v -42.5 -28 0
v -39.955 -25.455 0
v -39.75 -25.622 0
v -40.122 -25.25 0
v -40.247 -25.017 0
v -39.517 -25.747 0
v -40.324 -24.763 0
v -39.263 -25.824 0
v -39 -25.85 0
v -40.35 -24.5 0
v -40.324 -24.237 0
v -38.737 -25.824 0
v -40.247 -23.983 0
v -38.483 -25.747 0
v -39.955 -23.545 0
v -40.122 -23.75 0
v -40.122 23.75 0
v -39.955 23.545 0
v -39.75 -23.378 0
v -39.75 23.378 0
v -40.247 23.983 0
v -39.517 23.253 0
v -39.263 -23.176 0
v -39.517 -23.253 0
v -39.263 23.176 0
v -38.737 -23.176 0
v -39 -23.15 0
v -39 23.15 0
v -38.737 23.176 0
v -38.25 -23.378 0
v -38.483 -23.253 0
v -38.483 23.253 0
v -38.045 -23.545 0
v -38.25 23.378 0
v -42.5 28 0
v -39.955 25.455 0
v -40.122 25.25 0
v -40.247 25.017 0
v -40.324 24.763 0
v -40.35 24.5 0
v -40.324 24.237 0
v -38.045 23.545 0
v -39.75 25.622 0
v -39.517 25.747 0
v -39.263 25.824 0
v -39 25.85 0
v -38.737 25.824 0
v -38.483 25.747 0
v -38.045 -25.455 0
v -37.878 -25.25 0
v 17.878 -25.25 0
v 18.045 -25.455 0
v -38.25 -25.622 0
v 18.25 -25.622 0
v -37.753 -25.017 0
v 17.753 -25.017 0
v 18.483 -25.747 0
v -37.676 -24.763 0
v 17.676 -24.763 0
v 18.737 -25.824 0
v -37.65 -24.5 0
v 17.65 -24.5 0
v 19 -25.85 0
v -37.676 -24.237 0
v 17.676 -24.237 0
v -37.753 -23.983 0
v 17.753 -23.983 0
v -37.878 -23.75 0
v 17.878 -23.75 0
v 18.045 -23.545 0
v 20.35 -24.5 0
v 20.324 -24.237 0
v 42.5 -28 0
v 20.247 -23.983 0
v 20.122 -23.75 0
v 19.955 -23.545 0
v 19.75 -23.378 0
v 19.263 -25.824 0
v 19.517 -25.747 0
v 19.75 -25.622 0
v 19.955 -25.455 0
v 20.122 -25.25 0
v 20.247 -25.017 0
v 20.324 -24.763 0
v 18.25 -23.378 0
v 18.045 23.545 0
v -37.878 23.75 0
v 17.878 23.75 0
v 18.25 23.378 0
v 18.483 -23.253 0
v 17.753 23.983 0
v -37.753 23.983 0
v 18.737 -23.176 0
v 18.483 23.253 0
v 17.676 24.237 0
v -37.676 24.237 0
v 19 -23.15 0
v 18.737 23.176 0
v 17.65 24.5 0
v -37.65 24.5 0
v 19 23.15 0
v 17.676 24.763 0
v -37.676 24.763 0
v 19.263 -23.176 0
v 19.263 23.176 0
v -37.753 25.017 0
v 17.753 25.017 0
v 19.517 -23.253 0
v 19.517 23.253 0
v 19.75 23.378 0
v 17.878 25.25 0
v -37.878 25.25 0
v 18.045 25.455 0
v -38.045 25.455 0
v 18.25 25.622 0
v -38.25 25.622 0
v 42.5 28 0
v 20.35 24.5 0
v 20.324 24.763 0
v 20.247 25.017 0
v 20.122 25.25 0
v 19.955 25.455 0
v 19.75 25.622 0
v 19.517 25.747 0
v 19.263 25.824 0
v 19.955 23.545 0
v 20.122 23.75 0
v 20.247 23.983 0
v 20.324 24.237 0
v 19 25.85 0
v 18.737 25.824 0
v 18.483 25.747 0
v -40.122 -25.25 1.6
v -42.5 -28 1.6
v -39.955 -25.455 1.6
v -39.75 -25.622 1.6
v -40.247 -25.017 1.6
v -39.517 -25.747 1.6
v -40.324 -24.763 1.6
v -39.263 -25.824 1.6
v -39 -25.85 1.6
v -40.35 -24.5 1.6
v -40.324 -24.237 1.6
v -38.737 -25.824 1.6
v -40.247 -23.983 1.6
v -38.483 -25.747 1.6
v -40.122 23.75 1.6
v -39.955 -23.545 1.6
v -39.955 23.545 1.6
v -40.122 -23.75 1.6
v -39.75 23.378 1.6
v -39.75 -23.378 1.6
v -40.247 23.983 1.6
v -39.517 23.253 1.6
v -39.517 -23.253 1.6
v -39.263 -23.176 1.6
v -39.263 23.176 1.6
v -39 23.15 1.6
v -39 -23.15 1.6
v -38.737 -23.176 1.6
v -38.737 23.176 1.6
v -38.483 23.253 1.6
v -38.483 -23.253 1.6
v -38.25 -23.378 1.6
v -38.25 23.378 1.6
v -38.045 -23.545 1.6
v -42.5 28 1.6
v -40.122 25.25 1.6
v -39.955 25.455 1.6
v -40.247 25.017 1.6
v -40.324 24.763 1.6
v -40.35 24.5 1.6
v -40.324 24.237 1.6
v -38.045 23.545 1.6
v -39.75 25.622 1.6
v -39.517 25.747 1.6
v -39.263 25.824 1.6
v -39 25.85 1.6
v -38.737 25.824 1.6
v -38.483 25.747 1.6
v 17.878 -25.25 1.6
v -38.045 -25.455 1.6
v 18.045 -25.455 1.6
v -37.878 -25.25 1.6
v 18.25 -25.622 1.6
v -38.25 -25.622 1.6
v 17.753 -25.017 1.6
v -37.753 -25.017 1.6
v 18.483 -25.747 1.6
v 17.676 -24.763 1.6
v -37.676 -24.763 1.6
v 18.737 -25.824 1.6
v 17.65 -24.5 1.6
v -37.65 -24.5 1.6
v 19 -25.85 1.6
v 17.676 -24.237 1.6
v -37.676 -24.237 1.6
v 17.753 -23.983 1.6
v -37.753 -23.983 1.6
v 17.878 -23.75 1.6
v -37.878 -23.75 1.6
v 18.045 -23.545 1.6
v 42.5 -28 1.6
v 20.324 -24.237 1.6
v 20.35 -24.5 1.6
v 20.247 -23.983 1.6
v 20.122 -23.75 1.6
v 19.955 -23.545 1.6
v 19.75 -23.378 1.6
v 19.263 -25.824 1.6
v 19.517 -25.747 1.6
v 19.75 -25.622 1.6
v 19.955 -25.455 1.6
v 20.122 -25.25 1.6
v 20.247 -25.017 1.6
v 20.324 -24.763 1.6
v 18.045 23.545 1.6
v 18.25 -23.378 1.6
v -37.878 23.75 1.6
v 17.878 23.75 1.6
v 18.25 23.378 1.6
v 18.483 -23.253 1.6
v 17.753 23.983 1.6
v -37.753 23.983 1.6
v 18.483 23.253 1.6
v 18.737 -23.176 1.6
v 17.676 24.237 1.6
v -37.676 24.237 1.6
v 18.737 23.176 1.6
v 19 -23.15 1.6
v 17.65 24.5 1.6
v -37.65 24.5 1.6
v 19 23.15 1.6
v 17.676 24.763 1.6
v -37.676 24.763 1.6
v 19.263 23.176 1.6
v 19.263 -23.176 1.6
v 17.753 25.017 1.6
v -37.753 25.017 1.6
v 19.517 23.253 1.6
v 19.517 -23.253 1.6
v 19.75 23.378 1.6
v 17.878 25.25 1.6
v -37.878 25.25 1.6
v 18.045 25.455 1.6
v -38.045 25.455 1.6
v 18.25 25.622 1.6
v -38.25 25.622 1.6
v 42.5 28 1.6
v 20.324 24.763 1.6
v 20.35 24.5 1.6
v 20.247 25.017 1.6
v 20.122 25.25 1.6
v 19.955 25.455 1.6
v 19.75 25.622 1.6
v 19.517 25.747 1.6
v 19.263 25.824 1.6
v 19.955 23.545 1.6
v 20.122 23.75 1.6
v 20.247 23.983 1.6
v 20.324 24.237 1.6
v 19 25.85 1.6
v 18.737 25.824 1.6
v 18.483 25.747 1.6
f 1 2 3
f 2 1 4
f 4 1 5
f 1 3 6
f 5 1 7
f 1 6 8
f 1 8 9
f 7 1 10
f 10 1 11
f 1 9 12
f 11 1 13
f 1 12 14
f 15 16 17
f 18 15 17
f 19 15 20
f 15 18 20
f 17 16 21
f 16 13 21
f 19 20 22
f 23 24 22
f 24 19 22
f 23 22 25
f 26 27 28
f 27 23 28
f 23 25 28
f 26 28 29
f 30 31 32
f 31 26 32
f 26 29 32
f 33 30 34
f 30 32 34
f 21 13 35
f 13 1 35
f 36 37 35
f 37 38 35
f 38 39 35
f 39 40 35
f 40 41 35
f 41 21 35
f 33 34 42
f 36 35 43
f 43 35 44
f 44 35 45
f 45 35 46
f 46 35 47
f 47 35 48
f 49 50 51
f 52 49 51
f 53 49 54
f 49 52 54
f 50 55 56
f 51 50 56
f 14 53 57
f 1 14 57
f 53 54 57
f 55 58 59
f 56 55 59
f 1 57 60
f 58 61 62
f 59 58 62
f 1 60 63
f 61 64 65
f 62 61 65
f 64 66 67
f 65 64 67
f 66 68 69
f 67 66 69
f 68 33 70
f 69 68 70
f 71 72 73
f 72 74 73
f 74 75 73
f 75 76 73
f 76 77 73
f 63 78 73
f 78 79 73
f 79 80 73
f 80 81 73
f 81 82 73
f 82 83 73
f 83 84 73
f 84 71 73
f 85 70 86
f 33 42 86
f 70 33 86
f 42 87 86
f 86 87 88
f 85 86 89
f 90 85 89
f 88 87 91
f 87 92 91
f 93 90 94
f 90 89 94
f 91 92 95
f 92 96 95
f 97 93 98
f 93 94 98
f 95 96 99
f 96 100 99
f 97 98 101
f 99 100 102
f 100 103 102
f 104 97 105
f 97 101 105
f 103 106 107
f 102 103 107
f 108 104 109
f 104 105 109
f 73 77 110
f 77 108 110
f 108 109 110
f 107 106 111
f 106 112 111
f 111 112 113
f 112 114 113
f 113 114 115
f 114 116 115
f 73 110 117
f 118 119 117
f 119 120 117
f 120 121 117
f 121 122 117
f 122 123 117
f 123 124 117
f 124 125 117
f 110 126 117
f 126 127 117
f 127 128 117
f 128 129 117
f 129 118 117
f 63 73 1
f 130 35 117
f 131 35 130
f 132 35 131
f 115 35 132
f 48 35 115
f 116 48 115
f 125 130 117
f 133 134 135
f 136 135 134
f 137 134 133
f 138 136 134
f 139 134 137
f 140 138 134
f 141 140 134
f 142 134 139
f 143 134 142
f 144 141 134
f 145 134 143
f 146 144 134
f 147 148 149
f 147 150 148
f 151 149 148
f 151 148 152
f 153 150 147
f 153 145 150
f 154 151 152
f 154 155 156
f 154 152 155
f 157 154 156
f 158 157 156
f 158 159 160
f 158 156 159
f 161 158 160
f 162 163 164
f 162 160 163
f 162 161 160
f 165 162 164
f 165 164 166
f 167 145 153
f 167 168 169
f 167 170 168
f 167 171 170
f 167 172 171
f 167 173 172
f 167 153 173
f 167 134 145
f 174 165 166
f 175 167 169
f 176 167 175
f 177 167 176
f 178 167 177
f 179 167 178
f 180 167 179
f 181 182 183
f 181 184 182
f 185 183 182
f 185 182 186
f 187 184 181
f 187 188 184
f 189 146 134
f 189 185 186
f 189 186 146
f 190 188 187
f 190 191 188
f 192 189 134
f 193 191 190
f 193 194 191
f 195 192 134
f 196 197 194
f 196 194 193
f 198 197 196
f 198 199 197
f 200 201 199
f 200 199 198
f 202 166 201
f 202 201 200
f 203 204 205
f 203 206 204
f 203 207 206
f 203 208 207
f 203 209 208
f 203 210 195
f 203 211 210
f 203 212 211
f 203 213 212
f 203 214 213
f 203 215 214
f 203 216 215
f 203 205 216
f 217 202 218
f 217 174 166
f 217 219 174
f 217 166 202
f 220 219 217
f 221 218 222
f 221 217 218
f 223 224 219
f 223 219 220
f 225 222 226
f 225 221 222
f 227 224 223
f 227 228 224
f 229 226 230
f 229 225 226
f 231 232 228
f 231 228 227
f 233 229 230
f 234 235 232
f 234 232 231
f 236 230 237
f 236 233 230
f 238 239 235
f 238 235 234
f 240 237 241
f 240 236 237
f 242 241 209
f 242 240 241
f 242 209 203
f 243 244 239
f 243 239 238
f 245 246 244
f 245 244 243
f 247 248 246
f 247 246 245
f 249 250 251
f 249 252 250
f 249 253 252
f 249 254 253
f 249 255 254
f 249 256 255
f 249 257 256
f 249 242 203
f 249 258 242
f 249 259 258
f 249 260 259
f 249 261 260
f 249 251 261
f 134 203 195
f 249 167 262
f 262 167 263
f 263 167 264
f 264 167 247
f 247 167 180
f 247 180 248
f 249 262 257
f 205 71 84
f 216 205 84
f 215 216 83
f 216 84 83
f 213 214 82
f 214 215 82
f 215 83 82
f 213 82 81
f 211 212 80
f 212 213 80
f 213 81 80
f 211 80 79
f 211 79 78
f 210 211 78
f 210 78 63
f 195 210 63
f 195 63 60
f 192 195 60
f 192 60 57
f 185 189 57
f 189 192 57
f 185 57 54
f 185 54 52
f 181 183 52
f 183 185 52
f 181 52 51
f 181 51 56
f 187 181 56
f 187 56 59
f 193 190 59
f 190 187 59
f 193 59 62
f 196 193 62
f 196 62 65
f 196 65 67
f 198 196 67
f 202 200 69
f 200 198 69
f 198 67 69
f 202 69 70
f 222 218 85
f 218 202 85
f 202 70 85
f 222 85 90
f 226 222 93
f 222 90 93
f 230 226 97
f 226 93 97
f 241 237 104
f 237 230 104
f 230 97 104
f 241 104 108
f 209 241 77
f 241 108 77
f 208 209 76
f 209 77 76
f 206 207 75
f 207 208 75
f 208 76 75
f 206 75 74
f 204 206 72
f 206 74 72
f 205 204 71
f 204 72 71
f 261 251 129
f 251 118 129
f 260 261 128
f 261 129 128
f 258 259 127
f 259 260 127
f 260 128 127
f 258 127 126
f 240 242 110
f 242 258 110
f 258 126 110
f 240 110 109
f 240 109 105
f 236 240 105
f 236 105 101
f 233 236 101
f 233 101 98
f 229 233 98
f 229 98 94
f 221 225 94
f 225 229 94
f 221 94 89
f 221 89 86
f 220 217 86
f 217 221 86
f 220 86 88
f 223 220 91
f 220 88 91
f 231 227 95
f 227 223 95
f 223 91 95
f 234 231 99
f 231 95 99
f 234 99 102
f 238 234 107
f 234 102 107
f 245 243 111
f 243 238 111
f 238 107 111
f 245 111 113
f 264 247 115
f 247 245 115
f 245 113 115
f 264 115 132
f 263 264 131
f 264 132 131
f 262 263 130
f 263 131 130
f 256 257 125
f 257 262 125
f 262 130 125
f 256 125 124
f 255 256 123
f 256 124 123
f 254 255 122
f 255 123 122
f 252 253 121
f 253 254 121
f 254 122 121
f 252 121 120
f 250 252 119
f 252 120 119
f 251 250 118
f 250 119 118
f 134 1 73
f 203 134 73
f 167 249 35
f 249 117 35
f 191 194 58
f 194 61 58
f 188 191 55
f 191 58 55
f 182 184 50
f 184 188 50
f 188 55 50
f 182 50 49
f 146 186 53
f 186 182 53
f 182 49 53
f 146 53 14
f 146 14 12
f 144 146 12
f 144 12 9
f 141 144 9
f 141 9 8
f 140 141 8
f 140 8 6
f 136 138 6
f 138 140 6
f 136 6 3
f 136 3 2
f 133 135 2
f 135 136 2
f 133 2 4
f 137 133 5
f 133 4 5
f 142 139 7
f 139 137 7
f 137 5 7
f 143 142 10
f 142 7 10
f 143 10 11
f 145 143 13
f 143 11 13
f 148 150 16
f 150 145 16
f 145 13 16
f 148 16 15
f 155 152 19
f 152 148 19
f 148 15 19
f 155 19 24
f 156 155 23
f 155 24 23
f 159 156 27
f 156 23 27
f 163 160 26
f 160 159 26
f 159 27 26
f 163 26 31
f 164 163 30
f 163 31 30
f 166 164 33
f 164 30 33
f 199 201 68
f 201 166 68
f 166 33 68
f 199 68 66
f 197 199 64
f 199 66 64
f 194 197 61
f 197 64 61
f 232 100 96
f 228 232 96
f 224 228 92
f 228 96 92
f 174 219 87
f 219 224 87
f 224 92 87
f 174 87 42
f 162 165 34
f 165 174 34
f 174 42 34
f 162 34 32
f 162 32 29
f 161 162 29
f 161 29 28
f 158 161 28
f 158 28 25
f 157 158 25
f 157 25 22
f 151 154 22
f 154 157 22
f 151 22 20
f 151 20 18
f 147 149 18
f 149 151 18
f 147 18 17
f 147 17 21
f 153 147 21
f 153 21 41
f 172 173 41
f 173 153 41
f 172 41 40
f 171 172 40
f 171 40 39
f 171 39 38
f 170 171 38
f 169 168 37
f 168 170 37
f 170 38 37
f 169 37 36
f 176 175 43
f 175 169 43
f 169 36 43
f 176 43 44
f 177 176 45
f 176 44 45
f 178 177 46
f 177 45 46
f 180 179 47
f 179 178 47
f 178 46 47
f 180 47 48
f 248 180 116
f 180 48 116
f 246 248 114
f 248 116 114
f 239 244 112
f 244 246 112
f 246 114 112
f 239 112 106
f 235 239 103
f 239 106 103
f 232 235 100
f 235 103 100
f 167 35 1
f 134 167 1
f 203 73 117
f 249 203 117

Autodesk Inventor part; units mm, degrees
ref_plane "YZ Plane" through (0, 0, 0) normal (1, 0, 0) x (0, 1, 0)
ref_plane "XZ Plane" through (0, 0, 0) normal (0, 1, 0) x (-1, 0, 0)
ref_plane "XY Plane" through (0, 0, 0) normal (0, 0, 1) x (1, 0, 0)
sketch "스케치1" plane through (0, 0, 0) normal (0, 0, 1) x (1, 0, 0)
  line L0 (42.5, 28) -> (-42.5, 28)
  line L1 (-42.5, 28) -> (-42.5, -28)
  line L2 (-42.5, -28) -> (42.5, -28)
  line L3 (42.5, -28) -> (42.5, 28)
  line L4 (42.5, 28) -> (-42.5, -28) construction
  line L5 (-42.5, 28) -> (42.5, -28) construction
  line L6 (-72.7833, -24.5) -> (84.8355, -24.5) construction
  line L7 (-54.7439, 24.5) -> (74.9249, 24.5) construction
  line L8 (-39, 38.1575) -> (-39, -32.6978) construction
  line L9 (19, 25.9558) -> (19, -29.4685) construction
  circle A0 centre (-39, 24.5) radius 1.35
  circle A1 centre (19, 24.5) radius 1.35
  circle A2 centre (-39, -24.5) radius 1.35
  circle A3 centre (19, -24.5) radius 1.35
  point P0 (0, 0)
  dimension "d0" = 85
  dimension "d1" = 56
  dimension "d2" = 3.5
  dimension "d3" = 3.5
  dimension "d4" = 3.5
  dimension "d5" = 23.5
  dimension "d6" = 2.7
  dimension "d7" = 2.7
  dimension "d8" = 2.7
  dimension "d9" = 2.7
extrude "돌출1" add sketch "스케치1" along normal blind 1.6
properties part number "라즈베리파이"
